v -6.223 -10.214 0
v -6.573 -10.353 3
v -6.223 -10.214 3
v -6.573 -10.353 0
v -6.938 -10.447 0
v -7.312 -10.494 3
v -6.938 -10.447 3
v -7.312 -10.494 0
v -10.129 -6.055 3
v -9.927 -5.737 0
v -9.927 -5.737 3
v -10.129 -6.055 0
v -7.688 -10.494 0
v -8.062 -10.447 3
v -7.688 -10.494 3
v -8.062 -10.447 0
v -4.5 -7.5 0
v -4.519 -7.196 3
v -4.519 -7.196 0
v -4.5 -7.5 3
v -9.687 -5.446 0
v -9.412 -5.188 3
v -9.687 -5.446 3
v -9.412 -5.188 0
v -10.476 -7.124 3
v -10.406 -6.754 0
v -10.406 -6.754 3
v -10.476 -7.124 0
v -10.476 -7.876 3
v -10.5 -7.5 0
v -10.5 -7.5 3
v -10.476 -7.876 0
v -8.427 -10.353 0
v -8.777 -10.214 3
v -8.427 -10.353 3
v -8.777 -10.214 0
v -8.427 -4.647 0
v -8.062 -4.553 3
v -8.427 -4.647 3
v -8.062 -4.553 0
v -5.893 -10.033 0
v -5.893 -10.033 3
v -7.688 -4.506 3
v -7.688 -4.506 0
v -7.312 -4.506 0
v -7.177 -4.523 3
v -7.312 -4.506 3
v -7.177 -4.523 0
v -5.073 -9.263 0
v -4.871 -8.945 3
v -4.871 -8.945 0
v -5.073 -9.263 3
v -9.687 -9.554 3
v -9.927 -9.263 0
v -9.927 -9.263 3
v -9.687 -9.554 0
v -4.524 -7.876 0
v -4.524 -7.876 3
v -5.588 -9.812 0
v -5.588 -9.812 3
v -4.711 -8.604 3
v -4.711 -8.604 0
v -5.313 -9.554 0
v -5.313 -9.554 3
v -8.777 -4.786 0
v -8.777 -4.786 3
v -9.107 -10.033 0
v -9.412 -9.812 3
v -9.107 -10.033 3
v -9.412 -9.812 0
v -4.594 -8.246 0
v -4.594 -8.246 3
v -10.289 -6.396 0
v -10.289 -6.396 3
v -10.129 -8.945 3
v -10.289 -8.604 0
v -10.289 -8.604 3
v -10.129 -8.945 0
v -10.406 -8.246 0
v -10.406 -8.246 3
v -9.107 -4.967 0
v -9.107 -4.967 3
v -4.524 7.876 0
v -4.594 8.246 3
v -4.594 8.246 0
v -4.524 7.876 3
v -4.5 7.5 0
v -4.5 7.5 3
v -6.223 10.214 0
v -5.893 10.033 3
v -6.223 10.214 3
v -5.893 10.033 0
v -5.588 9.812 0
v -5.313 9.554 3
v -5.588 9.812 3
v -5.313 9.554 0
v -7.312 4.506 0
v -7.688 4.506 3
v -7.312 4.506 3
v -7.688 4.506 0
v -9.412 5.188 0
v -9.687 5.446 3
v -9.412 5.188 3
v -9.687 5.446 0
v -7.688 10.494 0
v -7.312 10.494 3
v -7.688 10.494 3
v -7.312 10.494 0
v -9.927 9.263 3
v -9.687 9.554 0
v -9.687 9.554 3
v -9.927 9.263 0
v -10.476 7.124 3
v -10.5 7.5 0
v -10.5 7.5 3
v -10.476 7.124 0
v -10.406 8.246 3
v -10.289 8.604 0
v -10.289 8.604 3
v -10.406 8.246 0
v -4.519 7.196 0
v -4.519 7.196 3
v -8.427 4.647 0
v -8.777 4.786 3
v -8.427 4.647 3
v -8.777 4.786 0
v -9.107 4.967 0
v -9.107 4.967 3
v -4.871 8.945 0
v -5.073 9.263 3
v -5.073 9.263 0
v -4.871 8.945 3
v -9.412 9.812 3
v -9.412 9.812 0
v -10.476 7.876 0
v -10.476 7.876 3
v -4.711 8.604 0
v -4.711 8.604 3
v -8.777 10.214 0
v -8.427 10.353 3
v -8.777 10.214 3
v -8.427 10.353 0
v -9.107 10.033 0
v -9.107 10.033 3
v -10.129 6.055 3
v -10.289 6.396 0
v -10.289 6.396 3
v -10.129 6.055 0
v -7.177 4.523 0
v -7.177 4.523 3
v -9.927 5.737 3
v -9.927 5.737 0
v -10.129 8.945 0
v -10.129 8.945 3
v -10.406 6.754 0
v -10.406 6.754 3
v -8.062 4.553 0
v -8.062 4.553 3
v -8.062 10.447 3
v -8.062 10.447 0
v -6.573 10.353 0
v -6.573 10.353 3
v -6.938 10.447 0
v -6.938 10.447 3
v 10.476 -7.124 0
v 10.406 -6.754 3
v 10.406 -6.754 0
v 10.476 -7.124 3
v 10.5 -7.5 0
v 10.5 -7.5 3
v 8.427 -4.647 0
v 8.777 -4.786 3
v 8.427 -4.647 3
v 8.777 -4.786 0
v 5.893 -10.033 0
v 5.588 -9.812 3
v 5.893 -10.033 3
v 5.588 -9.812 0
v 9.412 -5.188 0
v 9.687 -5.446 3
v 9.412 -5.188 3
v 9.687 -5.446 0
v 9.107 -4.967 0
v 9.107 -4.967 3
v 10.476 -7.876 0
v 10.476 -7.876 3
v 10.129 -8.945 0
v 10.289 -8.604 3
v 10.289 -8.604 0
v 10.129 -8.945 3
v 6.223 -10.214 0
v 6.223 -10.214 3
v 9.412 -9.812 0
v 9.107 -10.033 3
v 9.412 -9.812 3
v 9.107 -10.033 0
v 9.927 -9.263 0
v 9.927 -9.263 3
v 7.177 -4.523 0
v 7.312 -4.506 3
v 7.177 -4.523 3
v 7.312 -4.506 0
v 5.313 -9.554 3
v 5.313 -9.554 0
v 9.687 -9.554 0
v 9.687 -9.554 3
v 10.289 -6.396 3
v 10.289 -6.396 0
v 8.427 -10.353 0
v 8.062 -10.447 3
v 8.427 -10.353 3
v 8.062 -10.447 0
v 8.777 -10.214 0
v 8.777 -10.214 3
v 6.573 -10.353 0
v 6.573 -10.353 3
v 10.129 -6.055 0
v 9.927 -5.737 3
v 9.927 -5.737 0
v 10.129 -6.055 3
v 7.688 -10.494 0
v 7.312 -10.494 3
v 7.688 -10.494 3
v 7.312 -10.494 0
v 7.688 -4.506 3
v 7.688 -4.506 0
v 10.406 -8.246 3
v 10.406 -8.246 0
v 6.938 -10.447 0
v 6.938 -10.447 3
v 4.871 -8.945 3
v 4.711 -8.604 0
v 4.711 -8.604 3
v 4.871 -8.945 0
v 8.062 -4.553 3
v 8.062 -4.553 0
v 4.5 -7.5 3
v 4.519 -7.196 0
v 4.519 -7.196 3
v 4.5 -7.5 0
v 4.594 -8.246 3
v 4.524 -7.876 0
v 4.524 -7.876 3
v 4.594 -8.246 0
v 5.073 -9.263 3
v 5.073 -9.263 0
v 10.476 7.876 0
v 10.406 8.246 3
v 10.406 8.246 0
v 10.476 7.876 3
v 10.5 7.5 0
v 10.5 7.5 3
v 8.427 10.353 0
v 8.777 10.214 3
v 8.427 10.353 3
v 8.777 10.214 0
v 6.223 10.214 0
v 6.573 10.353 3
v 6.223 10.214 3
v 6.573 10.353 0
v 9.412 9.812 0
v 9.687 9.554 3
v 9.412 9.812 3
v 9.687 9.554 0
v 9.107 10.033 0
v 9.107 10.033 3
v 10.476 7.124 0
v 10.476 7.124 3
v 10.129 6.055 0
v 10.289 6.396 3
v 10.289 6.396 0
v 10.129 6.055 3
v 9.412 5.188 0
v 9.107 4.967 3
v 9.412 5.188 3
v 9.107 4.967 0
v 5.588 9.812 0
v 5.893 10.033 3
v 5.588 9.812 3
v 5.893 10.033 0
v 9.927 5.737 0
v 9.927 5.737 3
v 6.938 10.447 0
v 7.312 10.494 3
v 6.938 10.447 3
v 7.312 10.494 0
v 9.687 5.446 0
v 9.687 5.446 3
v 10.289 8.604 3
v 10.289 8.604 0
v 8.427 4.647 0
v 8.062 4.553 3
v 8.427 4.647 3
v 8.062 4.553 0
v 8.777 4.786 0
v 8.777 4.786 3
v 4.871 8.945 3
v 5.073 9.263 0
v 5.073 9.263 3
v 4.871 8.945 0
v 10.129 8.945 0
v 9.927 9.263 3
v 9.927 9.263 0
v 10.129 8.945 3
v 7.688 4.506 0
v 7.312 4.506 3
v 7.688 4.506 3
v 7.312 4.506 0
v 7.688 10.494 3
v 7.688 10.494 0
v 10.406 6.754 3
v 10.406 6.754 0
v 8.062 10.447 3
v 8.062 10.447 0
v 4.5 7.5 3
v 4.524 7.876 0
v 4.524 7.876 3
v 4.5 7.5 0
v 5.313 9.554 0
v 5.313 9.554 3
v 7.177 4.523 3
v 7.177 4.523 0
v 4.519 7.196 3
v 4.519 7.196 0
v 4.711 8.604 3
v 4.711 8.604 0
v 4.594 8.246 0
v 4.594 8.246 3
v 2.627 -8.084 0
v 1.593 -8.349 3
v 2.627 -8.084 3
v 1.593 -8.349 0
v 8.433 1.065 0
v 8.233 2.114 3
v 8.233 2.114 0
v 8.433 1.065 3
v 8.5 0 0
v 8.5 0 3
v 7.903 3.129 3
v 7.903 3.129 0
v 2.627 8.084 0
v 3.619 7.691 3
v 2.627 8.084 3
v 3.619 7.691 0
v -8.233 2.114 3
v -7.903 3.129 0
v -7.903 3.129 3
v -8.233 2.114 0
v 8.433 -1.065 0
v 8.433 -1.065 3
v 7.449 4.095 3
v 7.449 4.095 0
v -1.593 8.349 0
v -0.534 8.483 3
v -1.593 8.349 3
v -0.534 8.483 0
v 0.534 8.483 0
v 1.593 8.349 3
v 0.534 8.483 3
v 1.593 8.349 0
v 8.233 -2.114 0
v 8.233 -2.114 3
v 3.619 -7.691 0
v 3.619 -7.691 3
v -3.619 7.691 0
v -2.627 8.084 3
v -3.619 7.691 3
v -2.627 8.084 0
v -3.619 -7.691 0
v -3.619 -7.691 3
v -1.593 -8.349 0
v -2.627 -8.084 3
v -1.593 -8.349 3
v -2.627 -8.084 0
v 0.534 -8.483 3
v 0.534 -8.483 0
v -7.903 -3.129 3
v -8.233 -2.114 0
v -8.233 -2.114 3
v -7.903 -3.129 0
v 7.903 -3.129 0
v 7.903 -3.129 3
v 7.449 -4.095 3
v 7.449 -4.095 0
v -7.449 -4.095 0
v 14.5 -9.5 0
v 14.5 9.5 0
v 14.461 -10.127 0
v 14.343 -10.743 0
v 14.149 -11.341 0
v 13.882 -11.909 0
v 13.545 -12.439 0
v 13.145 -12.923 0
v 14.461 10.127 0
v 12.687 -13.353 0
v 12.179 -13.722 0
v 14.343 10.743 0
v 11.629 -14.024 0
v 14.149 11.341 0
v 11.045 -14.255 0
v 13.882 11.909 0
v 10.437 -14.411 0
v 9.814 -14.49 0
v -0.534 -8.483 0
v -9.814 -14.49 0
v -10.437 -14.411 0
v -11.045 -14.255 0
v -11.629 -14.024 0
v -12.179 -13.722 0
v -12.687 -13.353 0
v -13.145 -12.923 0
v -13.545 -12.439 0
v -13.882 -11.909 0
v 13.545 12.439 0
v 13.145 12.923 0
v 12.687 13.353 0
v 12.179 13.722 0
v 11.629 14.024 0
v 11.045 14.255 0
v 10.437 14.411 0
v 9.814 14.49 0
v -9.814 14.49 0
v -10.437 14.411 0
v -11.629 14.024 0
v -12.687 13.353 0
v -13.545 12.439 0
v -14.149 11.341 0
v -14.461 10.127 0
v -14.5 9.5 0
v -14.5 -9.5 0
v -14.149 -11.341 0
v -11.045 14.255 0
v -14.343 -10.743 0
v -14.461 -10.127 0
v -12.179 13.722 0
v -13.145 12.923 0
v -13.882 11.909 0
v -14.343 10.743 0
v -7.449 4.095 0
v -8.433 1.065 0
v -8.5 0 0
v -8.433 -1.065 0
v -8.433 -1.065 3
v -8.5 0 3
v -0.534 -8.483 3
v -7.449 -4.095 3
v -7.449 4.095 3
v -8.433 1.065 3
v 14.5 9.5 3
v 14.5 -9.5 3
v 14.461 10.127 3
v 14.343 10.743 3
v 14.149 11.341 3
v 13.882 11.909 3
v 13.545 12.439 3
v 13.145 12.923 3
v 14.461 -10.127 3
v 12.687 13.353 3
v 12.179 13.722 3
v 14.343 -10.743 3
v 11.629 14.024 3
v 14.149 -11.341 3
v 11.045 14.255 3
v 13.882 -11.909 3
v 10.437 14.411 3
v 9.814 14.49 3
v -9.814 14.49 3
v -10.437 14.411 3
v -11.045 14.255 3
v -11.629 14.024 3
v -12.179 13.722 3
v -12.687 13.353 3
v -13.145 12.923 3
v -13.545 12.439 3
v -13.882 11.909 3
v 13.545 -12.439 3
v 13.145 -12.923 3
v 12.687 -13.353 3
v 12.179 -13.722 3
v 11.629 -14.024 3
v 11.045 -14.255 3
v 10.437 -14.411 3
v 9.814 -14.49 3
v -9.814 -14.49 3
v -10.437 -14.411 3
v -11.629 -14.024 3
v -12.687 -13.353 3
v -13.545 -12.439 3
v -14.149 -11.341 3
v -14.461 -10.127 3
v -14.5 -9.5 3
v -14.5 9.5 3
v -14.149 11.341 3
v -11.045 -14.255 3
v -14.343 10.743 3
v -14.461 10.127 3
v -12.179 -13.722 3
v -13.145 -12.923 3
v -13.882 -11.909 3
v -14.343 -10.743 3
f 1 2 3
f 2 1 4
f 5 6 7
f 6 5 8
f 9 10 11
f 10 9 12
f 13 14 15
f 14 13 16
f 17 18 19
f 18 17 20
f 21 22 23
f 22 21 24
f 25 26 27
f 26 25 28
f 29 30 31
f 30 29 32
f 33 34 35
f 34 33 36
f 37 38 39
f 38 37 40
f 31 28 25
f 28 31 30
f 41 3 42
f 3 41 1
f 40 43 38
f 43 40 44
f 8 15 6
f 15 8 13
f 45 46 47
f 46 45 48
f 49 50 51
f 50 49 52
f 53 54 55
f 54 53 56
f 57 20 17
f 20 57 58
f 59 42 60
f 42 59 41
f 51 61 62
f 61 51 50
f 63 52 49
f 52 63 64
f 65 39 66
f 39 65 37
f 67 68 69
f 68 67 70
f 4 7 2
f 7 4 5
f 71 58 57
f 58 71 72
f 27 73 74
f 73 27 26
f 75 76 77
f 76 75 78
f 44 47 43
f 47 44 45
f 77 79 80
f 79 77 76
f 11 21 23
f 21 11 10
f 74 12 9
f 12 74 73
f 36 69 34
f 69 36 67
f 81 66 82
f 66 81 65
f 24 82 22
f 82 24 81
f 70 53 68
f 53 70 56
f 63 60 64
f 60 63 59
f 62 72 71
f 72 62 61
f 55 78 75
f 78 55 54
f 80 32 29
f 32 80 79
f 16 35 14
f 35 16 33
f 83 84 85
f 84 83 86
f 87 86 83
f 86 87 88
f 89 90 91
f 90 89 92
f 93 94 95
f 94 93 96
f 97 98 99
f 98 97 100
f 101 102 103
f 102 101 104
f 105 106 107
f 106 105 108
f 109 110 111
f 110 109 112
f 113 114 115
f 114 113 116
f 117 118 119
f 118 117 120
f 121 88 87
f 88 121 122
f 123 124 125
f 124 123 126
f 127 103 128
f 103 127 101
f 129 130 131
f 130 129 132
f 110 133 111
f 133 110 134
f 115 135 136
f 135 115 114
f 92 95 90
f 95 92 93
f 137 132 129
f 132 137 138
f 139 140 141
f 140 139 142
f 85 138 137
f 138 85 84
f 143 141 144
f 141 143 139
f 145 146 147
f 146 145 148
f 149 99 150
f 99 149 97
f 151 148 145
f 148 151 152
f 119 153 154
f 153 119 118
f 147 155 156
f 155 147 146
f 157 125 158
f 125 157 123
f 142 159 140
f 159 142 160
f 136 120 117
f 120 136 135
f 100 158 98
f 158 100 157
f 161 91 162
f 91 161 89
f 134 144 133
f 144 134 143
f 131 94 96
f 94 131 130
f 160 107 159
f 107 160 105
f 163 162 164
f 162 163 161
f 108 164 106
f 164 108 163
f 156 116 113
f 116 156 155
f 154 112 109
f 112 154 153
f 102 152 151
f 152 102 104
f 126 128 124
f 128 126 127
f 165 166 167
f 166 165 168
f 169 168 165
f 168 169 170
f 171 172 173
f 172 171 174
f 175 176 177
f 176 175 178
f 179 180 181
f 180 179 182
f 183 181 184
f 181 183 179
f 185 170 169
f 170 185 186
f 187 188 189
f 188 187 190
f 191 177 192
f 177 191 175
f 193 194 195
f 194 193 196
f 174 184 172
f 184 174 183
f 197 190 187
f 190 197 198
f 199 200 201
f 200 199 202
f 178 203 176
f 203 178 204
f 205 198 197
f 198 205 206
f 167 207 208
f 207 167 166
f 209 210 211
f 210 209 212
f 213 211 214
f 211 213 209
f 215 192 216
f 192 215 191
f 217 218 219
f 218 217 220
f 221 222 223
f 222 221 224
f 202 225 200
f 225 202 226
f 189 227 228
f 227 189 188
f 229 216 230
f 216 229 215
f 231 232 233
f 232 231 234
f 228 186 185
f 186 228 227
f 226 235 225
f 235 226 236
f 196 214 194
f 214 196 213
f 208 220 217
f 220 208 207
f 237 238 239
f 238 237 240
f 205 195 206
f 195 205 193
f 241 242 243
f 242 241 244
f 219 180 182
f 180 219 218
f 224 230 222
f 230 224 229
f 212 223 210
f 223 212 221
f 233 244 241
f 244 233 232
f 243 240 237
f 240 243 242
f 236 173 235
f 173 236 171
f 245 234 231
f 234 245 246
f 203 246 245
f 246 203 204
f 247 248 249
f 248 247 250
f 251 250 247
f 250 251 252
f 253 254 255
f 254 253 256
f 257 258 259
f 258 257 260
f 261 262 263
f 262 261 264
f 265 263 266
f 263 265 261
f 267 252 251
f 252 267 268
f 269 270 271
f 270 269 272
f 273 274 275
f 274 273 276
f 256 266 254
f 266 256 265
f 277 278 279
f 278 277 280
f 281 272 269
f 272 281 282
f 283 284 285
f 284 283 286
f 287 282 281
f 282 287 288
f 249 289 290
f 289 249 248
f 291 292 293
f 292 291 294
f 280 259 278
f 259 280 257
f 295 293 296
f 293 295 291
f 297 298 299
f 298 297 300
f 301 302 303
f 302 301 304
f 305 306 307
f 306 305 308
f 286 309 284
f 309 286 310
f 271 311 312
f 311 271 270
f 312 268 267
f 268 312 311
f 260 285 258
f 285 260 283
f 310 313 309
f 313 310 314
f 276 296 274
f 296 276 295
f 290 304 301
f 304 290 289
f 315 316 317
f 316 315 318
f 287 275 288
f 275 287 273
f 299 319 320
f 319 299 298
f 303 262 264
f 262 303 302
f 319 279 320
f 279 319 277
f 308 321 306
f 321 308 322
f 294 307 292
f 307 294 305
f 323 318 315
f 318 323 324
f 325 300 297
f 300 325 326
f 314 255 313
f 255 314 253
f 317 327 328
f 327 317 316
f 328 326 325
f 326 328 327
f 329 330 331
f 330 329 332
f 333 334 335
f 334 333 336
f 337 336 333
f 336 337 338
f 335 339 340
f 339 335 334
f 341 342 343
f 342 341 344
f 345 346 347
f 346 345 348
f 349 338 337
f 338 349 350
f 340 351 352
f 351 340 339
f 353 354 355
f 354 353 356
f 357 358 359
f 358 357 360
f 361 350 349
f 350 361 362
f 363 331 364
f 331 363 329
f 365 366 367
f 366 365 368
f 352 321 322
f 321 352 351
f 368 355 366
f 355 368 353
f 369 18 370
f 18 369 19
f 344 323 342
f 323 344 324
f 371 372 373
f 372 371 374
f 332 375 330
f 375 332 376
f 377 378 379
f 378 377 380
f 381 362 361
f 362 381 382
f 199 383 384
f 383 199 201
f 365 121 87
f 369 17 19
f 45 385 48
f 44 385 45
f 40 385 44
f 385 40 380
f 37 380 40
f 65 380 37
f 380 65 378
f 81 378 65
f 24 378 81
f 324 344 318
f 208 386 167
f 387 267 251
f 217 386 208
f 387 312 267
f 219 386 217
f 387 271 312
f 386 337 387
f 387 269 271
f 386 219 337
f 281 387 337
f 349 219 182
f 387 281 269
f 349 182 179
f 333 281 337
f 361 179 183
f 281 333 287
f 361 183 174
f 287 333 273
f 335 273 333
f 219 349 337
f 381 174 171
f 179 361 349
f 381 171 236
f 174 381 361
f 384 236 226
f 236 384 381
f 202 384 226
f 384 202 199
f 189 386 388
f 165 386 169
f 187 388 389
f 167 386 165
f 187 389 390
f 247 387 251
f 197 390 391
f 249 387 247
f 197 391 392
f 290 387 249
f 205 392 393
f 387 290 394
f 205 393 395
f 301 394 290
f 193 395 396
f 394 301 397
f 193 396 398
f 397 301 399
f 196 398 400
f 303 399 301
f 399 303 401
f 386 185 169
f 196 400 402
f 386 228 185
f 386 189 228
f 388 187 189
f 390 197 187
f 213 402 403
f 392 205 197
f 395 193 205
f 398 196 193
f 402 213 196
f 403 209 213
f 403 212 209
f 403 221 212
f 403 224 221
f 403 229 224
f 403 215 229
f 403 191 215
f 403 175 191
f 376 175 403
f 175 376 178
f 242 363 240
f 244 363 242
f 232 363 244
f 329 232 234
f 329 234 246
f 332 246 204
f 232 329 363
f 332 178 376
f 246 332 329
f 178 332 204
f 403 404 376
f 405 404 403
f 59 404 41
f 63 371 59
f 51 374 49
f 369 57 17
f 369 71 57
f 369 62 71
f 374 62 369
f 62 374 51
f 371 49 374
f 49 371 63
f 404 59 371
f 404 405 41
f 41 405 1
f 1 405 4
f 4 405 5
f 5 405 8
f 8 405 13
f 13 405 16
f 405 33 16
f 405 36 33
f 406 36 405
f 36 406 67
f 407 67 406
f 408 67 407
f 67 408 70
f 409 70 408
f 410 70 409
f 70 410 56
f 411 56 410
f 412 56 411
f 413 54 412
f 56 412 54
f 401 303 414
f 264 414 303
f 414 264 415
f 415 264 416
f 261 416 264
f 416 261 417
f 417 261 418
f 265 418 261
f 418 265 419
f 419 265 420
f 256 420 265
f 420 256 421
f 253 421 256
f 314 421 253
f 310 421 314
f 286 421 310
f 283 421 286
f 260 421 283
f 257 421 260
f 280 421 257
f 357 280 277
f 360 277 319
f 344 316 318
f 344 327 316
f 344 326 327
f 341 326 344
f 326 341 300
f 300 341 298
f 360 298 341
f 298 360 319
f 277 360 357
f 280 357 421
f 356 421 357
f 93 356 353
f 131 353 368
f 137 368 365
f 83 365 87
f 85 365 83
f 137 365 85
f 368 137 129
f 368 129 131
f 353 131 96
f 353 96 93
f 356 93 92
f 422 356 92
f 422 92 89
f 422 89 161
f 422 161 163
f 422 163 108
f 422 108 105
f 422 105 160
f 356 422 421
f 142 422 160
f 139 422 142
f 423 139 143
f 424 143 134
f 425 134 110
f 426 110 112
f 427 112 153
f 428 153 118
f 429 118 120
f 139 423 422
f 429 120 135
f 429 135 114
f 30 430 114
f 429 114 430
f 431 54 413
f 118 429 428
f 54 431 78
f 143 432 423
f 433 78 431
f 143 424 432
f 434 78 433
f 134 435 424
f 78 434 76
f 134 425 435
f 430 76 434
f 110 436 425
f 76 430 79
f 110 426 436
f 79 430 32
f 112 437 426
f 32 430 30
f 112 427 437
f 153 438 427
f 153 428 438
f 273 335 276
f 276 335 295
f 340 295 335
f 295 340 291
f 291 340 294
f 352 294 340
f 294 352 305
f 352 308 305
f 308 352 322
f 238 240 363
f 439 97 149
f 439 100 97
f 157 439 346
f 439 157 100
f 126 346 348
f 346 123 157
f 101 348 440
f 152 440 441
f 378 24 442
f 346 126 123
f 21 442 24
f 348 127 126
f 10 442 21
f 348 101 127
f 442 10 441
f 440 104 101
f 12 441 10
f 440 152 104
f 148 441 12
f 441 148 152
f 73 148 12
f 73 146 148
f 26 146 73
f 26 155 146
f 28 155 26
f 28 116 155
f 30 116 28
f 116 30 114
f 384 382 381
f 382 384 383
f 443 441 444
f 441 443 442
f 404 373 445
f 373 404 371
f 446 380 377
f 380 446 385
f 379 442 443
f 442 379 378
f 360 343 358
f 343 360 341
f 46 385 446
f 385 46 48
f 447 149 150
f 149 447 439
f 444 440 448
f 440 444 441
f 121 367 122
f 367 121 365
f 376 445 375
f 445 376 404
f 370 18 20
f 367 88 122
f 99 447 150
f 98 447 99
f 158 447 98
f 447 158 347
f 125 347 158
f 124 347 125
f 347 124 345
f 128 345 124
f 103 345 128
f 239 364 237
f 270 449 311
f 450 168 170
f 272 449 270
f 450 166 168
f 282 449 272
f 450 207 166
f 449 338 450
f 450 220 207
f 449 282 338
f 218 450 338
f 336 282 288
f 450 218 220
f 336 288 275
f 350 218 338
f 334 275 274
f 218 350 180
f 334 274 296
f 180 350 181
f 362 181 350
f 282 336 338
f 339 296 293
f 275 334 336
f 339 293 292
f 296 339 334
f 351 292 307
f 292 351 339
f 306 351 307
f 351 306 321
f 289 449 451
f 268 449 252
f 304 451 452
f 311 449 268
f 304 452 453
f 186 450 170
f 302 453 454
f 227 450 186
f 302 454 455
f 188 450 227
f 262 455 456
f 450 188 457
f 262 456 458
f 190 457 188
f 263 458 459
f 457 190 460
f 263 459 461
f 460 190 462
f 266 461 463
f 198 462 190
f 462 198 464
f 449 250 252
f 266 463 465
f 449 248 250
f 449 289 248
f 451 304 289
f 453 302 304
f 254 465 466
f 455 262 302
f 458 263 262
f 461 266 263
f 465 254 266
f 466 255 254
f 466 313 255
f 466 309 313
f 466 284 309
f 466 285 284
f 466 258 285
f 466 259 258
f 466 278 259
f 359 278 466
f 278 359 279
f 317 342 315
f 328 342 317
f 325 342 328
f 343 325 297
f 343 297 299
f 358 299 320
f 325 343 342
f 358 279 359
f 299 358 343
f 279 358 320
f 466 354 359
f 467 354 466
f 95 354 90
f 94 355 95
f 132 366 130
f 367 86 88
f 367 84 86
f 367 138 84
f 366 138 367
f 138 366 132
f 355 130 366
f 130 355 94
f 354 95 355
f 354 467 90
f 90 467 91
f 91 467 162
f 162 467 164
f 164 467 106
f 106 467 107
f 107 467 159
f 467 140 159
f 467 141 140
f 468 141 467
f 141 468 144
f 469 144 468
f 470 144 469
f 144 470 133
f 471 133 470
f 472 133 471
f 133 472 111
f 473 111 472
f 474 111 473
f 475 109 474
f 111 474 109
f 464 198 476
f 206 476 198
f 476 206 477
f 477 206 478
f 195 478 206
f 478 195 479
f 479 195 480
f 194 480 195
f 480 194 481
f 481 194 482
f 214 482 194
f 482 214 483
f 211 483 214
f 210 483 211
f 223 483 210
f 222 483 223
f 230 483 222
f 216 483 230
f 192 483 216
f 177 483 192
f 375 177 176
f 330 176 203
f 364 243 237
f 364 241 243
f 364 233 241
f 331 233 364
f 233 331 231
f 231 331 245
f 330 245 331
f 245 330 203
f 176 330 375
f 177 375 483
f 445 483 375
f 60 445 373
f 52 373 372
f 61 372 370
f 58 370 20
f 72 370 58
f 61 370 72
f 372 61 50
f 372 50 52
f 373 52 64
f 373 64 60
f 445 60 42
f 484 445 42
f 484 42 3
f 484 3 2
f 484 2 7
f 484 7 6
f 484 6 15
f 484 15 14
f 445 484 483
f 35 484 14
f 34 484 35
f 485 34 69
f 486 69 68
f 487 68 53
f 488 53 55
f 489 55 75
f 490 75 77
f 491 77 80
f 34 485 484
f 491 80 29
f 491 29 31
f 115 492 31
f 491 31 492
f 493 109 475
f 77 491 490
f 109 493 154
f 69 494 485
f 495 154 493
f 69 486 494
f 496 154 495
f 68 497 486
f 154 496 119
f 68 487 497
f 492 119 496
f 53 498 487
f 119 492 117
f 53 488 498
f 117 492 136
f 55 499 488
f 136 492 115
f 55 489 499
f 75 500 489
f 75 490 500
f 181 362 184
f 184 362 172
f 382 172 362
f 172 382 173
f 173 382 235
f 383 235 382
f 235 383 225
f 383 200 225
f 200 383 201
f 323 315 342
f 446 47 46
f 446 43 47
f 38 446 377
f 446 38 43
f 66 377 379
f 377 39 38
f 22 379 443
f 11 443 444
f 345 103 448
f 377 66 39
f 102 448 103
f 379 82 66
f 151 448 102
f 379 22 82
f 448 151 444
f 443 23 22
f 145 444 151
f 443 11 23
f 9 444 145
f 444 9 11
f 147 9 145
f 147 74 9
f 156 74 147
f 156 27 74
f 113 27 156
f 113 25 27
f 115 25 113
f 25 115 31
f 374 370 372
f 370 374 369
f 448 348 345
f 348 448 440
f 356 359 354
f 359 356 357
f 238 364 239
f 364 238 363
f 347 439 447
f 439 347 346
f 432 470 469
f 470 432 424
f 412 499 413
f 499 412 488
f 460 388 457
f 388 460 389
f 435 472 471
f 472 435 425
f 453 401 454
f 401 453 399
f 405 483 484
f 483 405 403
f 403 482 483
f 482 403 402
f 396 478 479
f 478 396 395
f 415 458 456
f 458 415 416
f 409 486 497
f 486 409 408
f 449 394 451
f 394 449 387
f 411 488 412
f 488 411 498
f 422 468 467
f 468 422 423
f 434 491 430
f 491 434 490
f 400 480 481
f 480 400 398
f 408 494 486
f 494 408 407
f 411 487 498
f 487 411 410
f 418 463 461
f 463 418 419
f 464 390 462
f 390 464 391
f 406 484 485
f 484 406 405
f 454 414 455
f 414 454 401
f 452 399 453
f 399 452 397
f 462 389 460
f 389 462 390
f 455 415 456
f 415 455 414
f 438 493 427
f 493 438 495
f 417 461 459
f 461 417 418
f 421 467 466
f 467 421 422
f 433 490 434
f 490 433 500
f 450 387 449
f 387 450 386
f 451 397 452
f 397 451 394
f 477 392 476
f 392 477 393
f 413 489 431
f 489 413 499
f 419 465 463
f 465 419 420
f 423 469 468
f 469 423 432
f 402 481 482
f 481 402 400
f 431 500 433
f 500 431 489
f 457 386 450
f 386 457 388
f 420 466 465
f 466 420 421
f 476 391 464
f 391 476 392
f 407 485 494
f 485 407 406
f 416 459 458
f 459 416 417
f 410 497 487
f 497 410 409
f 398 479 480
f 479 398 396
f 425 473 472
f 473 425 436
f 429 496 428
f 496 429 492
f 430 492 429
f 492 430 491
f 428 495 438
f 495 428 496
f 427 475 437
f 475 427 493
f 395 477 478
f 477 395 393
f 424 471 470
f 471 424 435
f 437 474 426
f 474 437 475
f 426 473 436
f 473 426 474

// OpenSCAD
$fn = 50;


difference() {
	union() {
		hull() {
			translate(v = [-9.5000000000, 9.5000000000, 0]) {
				cylinder(h = 3, r = 5);
			}
			translate(v = [9.5000000000, 9.5000000000, 0]) {
				cylinder(h = 3, r = 5);
			}
			translate(v = [-9.5000000000, -9.5000000000, 0]) {
				cylinder(h = 3, r = 5);
			}
			translate(v = [9.5000000000, -9.5000000000, 0]) {
				cylinder(h = 3, r = 5);
			}
		}
	}
	union() {
		#translate(v = [-7.5000000000, -7.5000000000, -100.0000000000]) {
			cylinder(h = 200, r = 3.0000000000);
		}
		#translate(v = [-7.5000000000, 7.5000000000, -100.0000000000]) {
			cylinder(h = 200, r = 3.0000000000);
		}
		#translate(v = [7.5000000000, -7.5000000000, -100.0000000000]) {
			cylinder(h = 200, r = 3.0000000000);
		}
		#translate(v = [7.5000000000, 7.5000000000, -100.0000000000]) {
			cylinder(h = 200, r = 3.0000000000);
		}
		#cylinder(h = 3, r = 8.5000000000);
	}
}
